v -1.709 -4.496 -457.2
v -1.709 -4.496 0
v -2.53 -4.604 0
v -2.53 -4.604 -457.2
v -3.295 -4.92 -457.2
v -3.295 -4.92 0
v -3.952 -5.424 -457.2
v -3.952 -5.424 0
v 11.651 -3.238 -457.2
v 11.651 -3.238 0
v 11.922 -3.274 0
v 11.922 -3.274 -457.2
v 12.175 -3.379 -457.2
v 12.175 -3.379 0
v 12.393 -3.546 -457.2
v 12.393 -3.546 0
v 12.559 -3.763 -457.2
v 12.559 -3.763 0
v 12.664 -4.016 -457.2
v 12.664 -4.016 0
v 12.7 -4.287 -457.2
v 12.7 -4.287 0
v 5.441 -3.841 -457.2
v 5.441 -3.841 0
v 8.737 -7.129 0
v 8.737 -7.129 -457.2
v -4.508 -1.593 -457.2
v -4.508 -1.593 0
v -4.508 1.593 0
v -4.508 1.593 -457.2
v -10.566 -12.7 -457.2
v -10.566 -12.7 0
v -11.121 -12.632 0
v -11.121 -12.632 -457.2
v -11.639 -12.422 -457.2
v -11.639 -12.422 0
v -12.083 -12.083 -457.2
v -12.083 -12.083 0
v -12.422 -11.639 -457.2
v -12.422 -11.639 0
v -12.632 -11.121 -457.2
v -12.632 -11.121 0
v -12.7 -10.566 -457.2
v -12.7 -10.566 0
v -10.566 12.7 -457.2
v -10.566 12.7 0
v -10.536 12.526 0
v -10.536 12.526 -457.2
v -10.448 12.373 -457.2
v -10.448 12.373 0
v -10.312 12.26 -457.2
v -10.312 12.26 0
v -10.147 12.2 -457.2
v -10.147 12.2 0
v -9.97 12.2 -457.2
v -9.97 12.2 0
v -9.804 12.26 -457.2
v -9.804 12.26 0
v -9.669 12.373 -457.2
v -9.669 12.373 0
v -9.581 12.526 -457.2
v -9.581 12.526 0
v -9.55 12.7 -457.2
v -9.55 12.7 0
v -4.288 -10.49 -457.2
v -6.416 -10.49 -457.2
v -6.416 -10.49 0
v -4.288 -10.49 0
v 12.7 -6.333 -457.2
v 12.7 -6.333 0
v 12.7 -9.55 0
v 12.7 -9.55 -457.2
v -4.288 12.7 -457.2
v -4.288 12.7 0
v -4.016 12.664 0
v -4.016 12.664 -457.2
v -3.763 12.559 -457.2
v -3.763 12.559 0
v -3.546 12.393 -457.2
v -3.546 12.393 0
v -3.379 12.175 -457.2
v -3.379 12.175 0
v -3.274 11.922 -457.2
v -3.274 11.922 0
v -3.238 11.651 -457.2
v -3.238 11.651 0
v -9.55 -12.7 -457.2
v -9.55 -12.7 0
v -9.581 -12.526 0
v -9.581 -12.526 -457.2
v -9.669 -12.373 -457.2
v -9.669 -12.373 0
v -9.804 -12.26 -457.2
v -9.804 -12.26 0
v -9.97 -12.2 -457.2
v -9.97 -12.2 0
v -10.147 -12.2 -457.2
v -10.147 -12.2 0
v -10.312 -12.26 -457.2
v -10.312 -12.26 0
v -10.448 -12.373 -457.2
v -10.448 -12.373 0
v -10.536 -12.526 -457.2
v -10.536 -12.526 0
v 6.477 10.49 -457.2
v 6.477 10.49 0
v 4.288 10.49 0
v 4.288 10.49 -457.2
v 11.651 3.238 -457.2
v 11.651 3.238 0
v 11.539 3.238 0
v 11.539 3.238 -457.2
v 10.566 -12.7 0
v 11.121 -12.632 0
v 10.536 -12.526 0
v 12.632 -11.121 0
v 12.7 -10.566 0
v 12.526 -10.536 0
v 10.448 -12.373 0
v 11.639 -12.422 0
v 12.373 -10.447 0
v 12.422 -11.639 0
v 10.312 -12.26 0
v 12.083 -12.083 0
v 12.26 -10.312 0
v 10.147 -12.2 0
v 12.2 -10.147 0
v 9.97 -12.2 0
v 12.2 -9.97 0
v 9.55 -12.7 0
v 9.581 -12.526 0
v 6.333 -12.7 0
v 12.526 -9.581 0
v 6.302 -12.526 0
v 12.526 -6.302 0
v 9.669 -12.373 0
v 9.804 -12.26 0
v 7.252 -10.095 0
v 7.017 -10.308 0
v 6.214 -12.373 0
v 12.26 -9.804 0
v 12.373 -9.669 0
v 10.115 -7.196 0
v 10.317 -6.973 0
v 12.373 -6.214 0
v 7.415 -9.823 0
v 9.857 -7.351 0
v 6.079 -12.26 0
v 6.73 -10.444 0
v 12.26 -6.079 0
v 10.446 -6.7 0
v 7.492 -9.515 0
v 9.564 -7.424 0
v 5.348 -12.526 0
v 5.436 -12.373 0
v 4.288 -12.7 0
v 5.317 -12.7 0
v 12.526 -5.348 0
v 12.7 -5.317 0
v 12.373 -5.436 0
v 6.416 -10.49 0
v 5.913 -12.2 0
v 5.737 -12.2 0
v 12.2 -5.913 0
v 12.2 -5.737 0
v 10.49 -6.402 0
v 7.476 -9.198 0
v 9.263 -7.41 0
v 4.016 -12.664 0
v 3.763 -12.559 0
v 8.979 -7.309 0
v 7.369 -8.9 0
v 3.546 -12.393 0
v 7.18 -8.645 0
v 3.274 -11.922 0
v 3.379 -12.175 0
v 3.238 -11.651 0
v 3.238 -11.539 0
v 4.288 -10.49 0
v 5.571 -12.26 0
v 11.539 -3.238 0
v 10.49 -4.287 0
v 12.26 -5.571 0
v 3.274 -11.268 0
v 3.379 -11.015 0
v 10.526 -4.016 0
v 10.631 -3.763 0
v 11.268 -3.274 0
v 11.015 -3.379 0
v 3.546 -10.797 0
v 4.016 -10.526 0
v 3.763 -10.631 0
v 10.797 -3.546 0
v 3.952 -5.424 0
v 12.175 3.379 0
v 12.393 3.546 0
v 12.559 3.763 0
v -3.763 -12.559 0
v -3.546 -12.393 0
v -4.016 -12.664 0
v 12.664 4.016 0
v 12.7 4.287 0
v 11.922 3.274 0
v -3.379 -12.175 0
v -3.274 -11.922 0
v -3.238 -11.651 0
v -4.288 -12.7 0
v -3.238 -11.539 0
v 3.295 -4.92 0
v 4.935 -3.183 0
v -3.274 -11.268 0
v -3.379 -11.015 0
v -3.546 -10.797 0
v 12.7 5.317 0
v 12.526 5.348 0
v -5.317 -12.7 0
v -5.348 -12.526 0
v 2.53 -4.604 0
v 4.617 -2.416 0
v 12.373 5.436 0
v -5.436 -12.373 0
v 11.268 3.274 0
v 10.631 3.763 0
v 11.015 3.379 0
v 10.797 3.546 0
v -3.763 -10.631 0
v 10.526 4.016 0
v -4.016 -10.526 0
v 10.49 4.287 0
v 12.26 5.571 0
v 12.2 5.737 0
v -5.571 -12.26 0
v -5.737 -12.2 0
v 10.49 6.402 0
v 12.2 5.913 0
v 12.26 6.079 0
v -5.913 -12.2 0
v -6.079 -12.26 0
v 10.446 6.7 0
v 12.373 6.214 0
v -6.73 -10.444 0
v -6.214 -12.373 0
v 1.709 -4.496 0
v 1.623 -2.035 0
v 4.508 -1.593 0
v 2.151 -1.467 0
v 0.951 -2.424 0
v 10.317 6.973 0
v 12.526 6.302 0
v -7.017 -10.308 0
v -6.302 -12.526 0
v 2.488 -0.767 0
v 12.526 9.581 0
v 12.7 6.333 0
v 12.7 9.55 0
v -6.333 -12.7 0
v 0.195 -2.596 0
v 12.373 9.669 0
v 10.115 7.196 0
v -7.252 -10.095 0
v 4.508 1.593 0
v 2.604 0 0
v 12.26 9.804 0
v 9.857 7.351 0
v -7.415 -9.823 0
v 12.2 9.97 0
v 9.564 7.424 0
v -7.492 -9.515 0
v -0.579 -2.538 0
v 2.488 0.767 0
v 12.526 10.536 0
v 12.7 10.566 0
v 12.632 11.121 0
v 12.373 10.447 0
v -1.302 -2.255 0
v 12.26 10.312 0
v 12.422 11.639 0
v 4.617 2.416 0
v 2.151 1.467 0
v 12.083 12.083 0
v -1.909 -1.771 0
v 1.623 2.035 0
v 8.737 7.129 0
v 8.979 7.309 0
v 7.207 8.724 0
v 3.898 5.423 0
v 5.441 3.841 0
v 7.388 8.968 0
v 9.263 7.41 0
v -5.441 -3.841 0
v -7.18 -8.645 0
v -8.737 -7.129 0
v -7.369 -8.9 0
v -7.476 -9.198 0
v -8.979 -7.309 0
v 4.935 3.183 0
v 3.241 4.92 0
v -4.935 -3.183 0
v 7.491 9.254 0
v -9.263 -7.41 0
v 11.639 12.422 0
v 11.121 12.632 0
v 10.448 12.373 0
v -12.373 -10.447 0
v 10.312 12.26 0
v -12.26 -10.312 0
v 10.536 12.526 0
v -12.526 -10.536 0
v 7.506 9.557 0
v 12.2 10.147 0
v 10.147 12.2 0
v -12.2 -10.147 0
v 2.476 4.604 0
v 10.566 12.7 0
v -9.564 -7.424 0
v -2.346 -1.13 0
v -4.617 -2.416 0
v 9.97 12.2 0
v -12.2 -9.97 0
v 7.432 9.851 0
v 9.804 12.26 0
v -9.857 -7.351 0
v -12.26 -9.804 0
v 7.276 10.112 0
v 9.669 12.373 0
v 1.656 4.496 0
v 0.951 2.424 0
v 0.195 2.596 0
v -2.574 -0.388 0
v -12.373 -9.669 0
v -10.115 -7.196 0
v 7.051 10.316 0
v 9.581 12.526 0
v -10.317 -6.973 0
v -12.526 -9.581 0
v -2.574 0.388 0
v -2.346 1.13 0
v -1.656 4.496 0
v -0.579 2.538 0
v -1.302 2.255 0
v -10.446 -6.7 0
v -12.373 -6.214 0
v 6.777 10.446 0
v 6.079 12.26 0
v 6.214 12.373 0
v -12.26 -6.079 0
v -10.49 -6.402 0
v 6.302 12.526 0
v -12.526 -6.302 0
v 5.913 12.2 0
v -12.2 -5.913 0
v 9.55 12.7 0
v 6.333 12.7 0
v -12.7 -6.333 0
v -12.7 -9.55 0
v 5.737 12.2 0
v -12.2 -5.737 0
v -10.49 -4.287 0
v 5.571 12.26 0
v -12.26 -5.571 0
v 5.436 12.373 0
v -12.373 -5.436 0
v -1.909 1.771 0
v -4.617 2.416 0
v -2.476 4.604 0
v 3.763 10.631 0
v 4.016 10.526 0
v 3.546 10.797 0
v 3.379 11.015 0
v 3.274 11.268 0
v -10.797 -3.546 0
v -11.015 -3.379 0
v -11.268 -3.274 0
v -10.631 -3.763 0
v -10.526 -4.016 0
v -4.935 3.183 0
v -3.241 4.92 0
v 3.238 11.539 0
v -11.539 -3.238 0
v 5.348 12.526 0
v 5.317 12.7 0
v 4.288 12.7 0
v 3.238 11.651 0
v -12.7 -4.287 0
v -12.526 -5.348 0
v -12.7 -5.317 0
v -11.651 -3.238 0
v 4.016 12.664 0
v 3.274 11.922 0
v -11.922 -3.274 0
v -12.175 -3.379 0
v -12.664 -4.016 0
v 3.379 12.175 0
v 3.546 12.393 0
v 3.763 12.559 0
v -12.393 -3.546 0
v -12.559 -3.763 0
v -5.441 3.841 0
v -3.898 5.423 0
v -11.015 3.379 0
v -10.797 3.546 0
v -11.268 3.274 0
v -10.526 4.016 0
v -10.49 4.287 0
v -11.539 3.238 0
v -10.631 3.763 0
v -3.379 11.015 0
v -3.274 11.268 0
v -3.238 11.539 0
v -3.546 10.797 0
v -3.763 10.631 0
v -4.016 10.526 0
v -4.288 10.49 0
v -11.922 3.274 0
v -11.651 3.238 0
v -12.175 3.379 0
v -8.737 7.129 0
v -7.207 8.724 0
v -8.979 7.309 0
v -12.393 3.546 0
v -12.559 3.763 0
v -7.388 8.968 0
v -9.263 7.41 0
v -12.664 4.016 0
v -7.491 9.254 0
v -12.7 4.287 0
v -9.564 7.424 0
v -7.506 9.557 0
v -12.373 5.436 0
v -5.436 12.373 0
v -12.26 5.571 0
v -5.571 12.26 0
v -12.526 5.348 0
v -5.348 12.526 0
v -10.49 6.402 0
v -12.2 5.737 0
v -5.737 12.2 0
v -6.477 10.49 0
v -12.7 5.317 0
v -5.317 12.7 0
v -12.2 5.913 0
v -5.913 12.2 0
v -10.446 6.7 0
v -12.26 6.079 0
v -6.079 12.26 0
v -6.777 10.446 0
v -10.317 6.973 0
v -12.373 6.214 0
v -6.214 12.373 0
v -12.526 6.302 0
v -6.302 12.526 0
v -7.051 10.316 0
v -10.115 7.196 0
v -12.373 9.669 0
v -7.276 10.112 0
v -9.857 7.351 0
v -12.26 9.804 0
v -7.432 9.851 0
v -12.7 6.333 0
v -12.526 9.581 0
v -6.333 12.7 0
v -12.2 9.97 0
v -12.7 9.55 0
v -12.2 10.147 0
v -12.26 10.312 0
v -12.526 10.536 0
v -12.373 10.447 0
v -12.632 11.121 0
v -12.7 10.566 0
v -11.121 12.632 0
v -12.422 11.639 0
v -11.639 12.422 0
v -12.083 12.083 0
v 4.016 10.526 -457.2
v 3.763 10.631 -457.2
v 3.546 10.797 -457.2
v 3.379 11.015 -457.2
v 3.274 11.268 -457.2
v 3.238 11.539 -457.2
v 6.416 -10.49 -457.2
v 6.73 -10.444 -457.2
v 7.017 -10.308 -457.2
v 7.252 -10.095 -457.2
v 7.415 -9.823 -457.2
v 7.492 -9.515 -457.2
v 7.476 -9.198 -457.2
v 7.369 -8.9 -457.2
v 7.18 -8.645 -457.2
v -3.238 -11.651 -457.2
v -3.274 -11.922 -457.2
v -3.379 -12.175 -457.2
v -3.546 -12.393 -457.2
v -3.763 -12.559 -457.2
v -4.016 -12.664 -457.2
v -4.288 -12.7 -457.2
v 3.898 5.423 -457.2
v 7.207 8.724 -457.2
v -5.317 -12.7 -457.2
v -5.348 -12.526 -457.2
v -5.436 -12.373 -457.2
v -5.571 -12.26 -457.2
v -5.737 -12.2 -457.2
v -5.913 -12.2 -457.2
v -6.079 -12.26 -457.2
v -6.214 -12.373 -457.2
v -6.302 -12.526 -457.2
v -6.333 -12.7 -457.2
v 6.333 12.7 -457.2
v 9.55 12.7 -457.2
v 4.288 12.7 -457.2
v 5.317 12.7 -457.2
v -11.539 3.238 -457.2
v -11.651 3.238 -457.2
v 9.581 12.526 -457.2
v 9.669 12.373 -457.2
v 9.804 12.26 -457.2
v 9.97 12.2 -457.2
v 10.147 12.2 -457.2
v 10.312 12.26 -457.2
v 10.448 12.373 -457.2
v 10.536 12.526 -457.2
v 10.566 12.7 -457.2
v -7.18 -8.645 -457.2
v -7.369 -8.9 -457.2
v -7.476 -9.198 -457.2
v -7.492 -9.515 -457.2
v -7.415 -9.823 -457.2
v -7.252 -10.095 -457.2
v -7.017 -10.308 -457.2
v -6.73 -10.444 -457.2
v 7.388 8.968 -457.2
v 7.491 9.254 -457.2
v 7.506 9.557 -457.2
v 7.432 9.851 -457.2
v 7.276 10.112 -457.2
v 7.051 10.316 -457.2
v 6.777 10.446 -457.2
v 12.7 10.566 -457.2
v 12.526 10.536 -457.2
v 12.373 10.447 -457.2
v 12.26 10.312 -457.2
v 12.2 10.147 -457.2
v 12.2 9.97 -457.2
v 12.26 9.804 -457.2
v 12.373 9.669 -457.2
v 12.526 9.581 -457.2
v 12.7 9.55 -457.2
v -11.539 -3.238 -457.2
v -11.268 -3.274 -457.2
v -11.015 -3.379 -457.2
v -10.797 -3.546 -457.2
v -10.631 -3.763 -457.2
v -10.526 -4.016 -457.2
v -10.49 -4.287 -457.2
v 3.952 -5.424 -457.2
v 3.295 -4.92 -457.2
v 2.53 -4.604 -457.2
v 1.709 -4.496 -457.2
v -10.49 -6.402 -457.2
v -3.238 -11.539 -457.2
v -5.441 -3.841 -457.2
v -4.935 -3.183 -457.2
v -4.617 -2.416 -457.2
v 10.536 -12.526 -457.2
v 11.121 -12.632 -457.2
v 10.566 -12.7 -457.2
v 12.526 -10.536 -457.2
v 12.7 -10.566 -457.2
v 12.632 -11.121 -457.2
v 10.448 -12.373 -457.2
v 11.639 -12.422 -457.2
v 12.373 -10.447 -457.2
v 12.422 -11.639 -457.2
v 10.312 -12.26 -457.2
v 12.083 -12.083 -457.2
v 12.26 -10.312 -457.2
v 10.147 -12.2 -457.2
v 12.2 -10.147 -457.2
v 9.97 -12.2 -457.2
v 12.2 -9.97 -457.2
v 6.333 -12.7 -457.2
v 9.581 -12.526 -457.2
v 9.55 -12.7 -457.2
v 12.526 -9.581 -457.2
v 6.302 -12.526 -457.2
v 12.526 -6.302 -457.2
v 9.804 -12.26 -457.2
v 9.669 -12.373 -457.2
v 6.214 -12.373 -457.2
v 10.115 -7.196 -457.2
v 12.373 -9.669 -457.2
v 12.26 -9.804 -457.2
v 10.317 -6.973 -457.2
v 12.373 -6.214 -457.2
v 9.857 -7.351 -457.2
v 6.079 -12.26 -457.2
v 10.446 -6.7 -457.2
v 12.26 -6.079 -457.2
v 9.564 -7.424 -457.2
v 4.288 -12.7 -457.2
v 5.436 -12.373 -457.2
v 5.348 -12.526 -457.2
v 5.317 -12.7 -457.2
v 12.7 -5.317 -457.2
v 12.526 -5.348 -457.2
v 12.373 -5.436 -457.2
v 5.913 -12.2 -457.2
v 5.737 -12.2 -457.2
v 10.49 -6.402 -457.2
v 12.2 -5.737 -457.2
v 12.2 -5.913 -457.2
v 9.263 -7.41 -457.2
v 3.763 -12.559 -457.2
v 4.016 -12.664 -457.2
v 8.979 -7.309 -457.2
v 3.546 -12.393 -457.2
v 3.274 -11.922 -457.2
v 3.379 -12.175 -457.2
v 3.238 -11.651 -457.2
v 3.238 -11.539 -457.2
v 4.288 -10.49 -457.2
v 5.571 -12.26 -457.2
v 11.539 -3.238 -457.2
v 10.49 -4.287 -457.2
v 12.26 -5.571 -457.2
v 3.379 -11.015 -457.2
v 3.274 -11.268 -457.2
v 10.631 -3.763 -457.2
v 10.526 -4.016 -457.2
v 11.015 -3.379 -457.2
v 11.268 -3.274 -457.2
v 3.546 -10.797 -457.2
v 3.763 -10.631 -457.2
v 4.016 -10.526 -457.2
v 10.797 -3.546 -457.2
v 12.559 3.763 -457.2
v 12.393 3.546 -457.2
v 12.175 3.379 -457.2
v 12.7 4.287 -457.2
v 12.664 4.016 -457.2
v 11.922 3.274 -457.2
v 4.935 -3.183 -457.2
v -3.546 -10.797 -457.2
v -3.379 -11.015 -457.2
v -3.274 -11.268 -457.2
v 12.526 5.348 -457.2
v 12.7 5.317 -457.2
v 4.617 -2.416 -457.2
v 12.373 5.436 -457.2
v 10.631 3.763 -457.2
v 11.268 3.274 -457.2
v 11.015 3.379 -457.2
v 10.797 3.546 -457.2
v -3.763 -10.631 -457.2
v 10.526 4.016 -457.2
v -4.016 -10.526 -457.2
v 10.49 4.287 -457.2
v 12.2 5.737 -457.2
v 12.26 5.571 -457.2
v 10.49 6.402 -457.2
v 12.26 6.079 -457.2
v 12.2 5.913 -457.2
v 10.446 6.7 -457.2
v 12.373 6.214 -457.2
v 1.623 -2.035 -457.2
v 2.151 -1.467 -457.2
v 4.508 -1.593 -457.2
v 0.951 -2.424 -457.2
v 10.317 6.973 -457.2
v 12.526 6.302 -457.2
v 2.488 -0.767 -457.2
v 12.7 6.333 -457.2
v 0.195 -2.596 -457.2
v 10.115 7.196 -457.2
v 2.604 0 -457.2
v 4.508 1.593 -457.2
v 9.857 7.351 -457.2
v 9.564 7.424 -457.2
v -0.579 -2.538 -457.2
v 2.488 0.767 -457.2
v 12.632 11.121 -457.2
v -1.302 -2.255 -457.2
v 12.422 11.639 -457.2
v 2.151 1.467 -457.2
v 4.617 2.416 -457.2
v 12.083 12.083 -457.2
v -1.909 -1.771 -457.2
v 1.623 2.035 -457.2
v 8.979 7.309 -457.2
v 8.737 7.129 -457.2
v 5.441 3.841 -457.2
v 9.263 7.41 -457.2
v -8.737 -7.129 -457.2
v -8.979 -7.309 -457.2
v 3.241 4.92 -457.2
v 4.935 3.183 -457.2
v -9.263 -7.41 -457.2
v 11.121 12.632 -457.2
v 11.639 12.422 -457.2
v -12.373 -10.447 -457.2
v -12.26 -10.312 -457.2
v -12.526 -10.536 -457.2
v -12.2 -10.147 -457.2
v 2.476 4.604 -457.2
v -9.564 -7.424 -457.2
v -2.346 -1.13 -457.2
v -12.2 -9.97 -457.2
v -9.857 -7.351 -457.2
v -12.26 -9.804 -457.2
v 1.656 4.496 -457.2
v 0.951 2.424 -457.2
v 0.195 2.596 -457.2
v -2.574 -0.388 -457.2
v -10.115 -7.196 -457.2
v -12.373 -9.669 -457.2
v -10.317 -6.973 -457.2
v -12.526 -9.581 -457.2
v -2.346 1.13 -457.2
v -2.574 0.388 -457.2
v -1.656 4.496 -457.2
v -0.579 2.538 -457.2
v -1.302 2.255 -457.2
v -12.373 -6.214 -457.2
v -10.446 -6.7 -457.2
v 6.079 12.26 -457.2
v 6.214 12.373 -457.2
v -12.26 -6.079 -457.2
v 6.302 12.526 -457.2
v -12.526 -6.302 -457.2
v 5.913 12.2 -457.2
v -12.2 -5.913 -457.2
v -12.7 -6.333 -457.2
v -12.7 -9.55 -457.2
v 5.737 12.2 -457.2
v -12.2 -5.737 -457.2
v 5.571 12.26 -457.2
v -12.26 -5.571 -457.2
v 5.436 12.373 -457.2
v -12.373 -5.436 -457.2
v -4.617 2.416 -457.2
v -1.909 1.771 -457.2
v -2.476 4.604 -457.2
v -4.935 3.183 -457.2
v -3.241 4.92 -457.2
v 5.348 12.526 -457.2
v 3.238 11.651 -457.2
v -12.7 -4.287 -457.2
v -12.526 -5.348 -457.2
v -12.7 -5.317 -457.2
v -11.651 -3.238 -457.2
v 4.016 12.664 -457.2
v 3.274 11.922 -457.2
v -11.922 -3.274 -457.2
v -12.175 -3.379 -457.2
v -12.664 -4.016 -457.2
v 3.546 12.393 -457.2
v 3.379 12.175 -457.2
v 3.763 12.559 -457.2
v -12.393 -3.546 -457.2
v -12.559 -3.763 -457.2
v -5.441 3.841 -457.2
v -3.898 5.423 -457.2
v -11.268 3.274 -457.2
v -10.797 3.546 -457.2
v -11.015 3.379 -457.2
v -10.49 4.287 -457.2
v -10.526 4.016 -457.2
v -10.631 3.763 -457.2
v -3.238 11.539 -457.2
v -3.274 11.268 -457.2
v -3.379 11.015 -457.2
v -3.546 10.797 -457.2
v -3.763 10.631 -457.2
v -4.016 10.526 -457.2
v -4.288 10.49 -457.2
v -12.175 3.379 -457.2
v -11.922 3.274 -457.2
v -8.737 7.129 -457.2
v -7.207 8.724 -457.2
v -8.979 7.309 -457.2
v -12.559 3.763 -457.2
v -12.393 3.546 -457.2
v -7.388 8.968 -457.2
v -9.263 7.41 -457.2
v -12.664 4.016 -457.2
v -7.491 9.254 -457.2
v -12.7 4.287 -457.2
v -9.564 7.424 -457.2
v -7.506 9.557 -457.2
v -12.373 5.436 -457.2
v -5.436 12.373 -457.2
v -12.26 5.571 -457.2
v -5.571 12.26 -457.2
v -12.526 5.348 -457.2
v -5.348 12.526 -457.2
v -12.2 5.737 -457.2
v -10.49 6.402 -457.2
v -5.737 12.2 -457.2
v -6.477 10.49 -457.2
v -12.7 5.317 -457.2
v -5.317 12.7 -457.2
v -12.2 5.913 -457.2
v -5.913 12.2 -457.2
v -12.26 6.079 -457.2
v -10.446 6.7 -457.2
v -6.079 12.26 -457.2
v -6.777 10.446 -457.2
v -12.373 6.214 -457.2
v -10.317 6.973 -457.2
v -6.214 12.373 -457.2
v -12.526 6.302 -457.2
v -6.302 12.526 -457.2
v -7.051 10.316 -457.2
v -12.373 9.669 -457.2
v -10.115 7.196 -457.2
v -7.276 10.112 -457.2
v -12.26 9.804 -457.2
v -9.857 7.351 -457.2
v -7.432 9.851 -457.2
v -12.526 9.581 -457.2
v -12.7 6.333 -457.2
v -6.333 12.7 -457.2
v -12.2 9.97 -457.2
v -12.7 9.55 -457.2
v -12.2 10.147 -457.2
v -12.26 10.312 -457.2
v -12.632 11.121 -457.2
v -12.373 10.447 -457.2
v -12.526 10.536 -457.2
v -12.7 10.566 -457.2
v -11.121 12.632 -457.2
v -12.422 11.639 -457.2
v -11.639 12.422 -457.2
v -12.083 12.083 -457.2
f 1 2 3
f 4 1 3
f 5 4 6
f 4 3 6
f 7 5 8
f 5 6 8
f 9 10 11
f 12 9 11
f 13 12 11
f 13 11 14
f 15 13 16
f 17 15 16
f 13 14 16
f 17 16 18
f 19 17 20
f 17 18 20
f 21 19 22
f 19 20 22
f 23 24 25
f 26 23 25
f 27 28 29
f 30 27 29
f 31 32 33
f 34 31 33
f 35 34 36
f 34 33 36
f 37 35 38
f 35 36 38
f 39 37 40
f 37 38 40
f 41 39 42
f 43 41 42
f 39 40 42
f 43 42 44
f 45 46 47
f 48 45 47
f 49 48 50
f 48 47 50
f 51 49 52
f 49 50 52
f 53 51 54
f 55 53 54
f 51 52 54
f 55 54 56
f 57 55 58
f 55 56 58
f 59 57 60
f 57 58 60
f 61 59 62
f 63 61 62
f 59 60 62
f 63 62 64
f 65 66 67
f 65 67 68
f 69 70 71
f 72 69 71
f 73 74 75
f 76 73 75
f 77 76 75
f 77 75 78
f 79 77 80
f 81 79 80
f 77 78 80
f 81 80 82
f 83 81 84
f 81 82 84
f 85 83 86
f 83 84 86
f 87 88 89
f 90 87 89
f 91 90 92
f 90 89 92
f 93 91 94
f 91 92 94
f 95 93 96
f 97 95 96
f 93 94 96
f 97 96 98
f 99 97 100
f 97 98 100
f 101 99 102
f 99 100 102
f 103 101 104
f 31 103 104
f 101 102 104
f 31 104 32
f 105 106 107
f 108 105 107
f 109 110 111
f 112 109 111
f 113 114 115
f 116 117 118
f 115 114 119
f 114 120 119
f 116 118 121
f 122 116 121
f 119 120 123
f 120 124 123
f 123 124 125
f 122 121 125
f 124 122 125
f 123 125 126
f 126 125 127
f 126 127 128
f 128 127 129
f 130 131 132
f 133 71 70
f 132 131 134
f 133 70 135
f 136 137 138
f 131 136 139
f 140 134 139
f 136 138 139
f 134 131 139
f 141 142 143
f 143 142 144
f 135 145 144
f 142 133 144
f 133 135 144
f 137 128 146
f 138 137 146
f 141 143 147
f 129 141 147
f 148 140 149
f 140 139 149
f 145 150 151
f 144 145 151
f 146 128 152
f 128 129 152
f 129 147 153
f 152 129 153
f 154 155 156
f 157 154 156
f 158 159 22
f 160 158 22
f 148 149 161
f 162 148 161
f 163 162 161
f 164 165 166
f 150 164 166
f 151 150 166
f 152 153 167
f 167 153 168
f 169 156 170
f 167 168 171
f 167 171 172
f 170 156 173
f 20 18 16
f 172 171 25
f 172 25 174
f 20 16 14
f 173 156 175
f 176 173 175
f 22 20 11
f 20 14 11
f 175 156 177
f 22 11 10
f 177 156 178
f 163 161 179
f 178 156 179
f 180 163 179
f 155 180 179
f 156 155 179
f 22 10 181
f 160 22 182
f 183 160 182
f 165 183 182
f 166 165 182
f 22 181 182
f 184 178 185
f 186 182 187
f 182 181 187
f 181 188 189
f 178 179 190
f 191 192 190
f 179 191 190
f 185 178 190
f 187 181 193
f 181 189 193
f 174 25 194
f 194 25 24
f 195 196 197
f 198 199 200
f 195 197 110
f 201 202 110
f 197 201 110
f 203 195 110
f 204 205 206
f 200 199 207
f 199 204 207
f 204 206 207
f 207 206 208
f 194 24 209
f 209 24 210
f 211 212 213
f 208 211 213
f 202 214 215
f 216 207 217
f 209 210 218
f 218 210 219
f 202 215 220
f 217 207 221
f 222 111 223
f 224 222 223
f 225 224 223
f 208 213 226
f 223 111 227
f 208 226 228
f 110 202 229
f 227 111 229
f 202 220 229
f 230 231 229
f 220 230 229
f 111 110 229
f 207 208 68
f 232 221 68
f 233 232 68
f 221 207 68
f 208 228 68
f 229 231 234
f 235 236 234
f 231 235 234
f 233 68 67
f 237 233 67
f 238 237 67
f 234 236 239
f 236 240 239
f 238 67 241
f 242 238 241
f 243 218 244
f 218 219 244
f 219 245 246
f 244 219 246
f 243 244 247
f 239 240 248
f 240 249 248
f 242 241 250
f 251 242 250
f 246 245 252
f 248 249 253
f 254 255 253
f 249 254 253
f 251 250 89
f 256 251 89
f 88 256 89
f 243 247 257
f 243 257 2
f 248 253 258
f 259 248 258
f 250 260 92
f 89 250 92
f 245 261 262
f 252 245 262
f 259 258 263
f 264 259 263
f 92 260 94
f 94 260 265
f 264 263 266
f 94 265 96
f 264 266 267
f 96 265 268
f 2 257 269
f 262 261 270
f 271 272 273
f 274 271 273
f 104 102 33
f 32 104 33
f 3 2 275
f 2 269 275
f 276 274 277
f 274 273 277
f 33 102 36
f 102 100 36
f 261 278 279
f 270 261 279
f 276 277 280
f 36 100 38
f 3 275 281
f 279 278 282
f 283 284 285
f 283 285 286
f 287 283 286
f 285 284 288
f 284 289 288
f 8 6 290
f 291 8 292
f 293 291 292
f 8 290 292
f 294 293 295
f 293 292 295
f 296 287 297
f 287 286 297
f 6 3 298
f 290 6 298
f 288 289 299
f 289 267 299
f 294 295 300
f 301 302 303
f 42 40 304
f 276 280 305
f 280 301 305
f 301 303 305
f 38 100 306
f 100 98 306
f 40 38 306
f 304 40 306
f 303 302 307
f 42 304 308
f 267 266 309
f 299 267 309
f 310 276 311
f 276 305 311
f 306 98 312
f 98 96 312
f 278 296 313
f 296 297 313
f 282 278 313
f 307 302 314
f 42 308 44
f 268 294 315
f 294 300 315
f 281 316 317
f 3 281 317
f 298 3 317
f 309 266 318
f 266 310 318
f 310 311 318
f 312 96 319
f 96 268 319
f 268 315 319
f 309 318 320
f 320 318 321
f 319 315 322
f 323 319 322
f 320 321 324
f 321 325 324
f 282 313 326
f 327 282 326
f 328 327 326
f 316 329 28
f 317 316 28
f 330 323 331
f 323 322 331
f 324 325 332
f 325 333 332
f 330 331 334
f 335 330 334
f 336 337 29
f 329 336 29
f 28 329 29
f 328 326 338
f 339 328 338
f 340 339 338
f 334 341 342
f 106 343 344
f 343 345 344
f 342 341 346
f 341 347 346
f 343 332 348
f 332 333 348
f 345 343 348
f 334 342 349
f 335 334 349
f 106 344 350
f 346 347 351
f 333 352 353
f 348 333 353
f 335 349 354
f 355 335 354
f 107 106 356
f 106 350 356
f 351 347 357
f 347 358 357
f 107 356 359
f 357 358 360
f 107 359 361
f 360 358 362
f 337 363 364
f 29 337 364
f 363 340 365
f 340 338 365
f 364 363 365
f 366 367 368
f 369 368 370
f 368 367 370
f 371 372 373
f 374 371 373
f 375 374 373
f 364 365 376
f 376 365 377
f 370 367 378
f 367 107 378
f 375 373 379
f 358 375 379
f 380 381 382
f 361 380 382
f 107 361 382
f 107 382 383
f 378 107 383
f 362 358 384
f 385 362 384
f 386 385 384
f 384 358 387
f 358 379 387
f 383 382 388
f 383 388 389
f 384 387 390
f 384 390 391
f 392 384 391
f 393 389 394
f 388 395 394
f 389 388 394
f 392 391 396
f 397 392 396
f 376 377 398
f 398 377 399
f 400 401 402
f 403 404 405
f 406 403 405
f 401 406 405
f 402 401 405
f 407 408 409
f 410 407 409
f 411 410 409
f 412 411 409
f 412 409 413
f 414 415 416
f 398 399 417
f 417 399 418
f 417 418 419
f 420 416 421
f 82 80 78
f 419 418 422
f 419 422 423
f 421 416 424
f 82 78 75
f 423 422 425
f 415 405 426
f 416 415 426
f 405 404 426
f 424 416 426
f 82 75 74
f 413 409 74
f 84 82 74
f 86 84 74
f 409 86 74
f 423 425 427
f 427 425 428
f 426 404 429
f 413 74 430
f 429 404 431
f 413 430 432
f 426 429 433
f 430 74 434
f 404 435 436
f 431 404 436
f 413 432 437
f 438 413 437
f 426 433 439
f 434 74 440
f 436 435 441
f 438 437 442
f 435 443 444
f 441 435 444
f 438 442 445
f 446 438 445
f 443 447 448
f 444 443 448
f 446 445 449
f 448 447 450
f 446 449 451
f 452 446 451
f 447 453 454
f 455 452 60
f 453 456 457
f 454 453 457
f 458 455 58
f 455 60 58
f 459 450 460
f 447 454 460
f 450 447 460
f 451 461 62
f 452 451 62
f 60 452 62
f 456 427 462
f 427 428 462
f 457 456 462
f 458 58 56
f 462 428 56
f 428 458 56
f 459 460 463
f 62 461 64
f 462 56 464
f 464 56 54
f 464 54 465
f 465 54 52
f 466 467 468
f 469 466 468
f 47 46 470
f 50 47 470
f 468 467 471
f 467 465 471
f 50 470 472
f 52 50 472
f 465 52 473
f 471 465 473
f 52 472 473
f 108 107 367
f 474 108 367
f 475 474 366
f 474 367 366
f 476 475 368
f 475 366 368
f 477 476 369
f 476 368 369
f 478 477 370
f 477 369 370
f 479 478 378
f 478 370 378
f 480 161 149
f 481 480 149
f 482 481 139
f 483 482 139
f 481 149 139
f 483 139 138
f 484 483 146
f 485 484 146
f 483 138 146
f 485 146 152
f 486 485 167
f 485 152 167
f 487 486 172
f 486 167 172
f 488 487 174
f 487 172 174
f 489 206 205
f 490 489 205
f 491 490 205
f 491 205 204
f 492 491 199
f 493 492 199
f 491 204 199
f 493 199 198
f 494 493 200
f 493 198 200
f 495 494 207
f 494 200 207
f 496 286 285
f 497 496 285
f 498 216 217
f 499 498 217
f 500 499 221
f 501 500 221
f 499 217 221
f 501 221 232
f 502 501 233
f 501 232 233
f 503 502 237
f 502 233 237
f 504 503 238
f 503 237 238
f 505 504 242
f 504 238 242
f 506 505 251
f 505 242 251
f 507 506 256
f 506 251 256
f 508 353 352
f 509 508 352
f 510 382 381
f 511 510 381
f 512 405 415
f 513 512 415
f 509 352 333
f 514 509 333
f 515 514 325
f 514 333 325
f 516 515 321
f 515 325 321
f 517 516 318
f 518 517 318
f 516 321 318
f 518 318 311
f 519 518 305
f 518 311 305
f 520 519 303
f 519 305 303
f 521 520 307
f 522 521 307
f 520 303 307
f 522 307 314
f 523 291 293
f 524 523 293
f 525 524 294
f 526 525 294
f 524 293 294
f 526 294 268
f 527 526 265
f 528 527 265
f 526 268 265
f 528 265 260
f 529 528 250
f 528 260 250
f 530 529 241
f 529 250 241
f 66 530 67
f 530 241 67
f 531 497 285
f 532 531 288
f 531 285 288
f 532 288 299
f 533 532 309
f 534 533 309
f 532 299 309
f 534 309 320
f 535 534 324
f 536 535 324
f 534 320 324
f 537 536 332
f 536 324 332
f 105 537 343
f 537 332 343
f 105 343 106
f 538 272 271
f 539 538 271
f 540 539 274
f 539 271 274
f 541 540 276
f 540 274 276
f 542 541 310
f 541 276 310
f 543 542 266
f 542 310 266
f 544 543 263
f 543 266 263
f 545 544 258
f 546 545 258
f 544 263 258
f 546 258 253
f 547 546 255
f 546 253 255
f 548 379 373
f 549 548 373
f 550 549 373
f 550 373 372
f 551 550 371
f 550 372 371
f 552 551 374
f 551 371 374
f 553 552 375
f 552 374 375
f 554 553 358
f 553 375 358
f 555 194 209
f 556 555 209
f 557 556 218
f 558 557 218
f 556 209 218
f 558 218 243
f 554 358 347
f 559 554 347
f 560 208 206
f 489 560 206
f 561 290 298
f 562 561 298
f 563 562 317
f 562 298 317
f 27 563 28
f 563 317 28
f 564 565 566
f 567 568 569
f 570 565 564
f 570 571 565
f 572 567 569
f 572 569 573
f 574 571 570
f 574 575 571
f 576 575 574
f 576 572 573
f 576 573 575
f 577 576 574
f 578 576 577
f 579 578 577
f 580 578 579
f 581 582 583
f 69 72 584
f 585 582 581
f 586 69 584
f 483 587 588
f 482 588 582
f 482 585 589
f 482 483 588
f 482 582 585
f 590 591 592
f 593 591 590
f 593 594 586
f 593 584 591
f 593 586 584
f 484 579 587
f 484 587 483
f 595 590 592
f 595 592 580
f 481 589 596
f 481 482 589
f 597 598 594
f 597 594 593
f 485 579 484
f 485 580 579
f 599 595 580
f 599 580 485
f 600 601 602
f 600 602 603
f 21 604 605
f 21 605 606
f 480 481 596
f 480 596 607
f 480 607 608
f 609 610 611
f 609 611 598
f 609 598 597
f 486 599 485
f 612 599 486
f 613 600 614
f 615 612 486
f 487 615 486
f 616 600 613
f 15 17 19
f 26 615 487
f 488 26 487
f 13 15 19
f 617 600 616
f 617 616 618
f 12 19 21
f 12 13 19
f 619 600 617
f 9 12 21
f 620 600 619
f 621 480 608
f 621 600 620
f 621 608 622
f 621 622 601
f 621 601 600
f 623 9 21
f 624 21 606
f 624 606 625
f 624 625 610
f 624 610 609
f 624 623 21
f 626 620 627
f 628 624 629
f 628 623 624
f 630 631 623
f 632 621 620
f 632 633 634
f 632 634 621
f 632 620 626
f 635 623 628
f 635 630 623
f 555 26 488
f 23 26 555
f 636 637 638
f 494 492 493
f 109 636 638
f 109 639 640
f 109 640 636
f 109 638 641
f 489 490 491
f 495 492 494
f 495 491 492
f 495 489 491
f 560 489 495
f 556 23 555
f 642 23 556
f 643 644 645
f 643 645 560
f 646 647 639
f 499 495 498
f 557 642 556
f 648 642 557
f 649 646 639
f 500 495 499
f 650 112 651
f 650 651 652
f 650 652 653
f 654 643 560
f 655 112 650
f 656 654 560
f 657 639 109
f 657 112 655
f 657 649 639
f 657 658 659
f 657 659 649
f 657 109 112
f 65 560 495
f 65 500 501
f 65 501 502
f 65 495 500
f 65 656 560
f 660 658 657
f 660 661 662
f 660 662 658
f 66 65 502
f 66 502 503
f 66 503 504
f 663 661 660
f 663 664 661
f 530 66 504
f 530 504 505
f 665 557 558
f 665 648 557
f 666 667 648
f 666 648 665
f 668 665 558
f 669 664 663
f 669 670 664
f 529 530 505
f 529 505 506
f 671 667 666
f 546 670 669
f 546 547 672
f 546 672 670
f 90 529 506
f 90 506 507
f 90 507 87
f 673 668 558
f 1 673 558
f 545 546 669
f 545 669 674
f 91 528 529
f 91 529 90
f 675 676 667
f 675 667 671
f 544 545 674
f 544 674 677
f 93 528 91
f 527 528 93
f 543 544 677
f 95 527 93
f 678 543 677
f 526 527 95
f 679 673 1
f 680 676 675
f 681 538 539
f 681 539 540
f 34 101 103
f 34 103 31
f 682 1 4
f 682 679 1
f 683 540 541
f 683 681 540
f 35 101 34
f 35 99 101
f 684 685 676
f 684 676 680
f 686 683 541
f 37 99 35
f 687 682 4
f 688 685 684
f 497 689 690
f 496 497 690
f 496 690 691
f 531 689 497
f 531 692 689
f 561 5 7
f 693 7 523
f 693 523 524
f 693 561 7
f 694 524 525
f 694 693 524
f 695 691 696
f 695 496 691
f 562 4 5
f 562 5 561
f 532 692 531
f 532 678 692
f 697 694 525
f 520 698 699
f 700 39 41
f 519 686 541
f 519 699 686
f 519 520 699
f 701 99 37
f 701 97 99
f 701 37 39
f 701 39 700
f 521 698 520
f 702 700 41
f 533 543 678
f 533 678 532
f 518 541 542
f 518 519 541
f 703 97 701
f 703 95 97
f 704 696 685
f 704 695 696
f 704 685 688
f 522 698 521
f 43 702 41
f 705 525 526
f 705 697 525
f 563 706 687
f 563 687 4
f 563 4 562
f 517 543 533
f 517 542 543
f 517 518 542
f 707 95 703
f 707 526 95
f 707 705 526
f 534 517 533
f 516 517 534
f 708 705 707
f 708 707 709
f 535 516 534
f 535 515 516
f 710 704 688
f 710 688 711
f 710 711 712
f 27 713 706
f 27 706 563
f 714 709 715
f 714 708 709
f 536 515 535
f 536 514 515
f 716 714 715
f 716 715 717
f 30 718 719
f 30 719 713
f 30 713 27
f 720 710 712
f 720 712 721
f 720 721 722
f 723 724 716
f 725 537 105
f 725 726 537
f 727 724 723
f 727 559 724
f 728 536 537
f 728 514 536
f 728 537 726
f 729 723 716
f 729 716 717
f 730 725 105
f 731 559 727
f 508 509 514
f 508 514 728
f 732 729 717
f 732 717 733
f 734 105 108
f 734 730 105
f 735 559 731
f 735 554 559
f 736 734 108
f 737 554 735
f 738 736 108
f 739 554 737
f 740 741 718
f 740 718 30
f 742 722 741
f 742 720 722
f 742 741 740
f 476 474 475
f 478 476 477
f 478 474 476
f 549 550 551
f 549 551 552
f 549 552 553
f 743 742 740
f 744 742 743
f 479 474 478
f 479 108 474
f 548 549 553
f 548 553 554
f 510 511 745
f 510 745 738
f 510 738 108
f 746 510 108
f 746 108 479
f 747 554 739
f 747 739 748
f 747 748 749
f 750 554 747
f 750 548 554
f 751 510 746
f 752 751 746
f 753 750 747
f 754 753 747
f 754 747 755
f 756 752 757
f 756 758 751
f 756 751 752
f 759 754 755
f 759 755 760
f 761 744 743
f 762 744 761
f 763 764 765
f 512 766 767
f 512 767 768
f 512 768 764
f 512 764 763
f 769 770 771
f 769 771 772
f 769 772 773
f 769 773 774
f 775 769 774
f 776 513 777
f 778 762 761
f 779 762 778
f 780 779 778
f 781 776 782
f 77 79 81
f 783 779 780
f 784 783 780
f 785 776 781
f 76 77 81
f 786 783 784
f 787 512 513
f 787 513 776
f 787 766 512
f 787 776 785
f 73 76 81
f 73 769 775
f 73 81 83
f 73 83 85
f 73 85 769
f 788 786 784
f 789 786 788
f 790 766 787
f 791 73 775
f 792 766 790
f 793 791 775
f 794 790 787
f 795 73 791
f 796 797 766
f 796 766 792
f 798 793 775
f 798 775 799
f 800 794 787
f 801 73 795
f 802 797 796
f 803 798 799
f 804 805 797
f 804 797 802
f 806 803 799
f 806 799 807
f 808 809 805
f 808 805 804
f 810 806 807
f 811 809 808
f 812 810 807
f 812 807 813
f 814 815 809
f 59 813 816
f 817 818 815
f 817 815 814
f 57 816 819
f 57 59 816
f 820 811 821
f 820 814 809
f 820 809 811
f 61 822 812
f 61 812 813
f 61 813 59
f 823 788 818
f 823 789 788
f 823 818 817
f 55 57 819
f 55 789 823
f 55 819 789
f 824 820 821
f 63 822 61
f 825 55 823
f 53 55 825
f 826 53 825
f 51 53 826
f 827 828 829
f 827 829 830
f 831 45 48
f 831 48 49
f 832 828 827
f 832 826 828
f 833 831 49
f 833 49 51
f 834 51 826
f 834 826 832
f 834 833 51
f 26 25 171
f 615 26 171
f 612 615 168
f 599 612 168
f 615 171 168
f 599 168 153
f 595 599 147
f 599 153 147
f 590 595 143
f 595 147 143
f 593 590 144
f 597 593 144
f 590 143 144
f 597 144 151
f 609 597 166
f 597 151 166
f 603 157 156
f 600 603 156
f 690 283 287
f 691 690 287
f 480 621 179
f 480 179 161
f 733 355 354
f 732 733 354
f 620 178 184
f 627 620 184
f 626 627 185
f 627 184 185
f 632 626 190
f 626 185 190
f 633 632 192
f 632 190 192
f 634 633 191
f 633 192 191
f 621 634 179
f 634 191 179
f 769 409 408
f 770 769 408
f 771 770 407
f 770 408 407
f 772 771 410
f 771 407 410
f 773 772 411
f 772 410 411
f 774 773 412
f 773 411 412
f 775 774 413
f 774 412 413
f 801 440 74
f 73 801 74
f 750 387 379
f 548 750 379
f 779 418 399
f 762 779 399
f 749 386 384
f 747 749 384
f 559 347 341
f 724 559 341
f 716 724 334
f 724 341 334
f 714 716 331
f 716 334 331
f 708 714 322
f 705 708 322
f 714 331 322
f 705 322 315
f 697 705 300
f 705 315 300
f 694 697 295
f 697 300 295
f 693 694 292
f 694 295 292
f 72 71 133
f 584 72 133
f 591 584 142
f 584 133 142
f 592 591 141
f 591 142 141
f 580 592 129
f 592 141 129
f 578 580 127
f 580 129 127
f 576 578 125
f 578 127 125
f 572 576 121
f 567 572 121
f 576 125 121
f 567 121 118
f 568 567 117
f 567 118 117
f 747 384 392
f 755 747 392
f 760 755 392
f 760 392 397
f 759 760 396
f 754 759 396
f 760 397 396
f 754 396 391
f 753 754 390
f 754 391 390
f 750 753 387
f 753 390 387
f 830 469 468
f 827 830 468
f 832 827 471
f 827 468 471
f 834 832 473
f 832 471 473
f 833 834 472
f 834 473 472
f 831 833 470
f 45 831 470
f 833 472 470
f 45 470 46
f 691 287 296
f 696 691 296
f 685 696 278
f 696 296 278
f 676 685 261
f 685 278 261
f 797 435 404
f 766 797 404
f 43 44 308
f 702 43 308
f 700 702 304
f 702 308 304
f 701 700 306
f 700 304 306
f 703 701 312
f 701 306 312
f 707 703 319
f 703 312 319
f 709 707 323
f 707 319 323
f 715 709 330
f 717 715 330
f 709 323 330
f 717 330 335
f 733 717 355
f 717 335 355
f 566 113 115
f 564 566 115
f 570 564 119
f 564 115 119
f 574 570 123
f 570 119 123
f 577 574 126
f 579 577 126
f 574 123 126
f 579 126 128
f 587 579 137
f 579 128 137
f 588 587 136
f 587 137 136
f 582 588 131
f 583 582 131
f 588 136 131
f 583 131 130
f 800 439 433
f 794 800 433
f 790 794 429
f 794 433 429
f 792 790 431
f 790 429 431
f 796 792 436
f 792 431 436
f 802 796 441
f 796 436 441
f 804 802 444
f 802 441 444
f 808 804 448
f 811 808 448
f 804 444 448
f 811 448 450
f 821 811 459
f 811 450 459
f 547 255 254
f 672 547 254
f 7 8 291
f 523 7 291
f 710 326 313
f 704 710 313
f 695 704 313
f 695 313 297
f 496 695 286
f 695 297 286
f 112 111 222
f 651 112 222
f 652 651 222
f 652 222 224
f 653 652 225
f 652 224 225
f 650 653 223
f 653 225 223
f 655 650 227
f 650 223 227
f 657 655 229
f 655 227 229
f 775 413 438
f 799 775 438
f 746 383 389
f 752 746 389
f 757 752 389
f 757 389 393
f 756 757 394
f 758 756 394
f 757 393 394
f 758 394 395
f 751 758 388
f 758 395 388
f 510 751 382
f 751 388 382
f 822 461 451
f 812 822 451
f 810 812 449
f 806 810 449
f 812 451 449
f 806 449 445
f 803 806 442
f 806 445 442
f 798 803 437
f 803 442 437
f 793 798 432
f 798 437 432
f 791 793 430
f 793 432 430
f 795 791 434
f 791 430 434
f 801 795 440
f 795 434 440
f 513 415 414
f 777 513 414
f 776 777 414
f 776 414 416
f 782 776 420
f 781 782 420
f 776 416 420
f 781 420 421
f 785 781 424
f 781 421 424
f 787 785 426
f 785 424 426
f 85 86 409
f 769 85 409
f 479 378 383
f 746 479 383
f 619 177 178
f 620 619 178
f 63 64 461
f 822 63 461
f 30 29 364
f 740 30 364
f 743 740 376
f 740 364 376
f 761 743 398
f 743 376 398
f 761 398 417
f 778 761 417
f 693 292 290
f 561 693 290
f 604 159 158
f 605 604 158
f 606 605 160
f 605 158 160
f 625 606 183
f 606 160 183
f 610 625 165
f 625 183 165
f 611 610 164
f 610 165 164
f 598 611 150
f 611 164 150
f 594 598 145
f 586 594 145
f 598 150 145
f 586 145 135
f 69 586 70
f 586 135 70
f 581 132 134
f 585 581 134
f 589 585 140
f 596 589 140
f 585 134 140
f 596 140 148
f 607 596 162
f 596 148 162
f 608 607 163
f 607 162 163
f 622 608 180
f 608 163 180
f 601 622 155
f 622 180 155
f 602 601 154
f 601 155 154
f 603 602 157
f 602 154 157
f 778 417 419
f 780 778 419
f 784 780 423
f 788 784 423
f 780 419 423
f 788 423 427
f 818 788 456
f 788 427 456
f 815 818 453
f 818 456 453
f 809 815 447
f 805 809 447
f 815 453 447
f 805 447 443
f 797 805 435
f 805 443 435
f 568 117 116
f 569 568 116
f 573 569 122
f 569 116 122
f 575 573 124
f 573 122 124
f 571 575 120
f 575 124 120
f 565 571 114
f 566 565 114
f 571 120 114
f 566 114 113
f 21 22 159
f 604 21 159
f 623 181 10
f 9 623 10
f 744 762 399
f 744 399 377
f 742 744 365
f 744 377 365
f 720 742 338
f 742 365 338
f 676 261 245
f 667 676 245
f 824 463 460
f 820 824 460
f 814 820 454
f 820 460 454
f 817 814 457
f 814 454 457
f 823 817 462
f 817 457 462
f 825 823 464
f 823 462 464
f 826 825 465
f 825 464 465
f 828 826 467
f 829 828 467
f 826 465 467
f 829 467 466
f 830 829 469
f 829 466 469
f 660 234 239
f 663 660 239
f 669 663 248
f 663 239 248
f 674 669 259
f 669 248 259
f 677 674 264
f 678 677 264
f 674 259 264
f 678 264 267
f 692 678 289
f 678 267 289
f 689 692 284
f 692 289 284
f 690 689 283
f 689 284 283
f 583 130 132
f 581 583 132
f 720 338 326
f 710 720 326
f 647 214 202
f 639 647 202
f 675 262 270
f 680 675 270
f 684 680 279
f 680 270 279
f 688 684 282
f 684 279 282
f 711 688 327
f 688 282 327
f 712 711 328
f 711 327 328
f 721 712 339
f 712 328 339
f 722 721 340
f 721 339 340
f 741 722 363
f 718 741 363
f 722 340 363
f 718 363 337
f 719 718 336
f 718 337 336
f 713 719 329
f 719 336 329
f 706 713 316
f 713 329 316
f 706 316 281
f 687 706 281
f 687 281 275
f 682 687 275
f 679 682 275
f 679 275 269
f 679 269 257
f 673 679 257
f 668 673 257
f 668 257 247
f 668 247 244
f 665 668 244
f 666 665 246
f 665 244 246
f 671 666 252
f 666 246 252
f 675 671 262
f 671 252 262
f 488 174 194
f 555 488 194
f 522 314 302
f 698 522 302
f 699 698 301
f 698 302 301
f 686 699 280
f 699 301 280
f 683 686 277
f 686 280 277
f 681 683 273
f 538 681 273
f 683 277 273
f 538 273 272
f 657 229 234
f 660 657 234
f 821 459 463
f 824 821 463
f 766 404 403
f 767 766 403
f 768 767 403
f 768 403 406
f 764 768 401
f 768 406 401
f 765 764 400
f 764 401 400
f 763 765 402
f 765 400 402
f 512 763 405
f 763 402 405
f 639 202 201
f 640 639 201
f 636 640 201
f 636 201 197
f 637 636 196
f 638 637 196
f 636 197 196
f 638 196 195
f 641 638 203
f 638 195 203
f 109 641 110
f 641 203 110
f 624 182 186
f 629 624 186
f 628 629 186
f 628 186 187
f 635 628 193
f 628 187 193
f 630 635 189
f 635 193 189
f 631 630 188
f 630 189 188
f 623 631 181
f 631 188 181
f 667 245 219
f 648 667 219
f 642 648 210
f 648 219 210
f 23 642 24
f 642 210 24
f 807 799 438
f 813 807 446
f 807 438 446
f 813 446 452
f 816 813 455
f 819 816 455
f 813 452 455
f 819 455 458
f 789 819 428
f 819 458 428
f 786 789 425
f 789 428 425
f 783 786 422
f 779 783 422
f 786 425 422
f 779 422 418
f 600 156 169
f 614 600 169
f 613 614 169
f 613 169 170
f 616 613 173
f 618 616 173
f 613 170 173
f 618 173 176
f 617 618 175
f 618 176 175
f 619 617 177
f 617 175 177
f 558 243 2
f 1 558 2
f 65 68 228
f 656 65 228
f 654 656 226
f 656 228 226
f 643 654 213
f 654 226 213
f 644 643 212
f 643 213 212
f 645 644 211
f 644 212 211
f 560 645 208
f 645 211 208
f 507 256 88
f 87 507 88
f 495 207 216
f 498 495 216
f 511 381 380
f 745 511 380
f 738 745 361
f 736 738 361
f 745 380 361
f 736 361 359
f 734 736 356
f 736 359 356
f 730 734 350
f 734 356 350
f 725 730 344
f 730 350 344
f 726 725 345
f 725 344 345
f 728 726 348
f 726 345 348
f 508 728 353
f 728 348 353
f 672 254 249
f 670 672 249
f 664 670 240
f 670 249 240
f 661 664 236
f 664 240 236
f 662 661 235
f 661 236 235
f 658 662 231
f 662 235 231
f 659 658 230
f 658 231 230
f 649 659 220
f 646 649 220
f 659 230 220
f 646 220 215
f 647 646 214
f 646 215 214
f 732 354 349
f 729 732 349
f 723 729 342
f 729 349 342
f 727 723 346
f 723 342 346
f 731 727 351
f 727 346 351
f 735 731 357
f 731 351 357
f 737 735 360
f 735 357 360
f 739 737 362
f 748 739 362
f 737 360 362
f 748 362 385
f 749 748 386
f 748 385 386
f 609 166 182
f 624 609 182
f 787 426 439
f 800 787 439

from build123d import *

# Parameters (mm, degrees)
SKETCH1_R      = 2.6035
EXTRUDE1_DEPTH = 457.2


with BuildPart() as part:
    # Sketch1 → Extrude1 (new body)
    with BuildSketch(Plane.XY):
        with BuildLine():
            Line((-7.207036008, 8.724370562), (-3.898272566, 5.423169045))
            ThreePointArc((-3.898272566, 5.423169045), (-2.869120213, 4.736787962), (-1.655778399, 4.4958))
            Line((-1.655778399, 4.4958), (1.655778399, 4.4958))
            ThreePointArc((1.655778399, 4.4958), (2.869120213, 4.736787962), (3.898272566, 5.423169045))
            Line((3.898272566, 5.423169045), (7.207036008, 8.724370562))
            ThreePointArc((7.207036008, 8.724370562), (7.432222385, 9.85140422), (6.476788598, 10.4902))
            Line((6.476788598, 10.4902), (4.287512407, 10.4902))
            ThreePointArc((4.287512407, 10.4902), (3.54574862, 10.79744862), (3.2385, 11.539212407))
            Line((3.2385, 11.539212407), (3.2385, 11.650987593))
            ThreePointArc((3.2385, 11.650987593), (3.54574862, 12.39275138), (4.287512407, 12.7))
            Line((4.287512407, 12.7), (5.317126718, 12.7))
            ThreePointArc((5.317126718, 12.7), (5.825126718, 12.192), (6.333126718, 12.7))
            Line((6.333126718, 12.7), (9.550443118, 12.7))
            ThreePointArc((9.550443118, 12.7), (10.058366869, 12.192000006), (10.566443095, 12.699847501))
            ThreePointArc((10.566443095, 12.699847501), (12.082537762, 12.08250727), (12.699846982, 10.566399977))
            ThreePointArc((12.699846982, 10.566399977), (12.192000006, 10.058323491), (12.7, 9.5504))
            Line((12.7, 9.5504), (12.7, 6.3330836))
            ThreePointArc((12.7, 6.3330836), (12.192, 5.8250836), (12.7, 5.3170836))
            Line((12.7, 5.3170836), (12.7, 4.287469289))
            ThreePointArc((12.7, 4.287469289), (12.39275138, 3.545705502), (11.650987593, 3.238456882))
            Line((11.650987593, 3.238456882), (11.539212407, 3.238456882))
            ThreePointArc((11.539212407, 3.238456882), (10.79744862, 3.545705502), (10.4902, 4.287469289))
            Line((10.4902, 4.287469289), (10.4902, 6.402089023))
            ThreePointArc((10.4902, 6.402089023), (9.856505071, 7.351067942), (8.737131347, 7.129408934))
            Line((8.737131347, 7.129408934), (5.441005833, 3.840816462))
            ThreePointArc((5.441005833, 3.840816462), (4.750877967, 2.809883091), (4.5085, 1.593185507))
            Line((4.5085, 1.593185507), (4.5085, -1.593185507))
            ThreePointArc((4.5085, -1.593185507), (4.750877967, -2.809883091), (5.441005833, -3.840816462))
            Line((5.441005833, -3.840816462), (8.737131347, -7.129408934))
            ThreePointArc((8.737131347, -7.129408934), (9.856505071, -7.351067942), (10.4902, -6.402089023))
            Line((10.4902, -6.402089023), (10.4902, -4.287469289))
            ThreePointArc((10.4902, -4.287469289), (10.79744862, -3.545705502), (11.539212407, -3.238456882))
            Line((11.539212407, -3.238456882), (11.650987593, -3.238456882))
            ThreePointArc((11.650987593, -3.238456882), (12.39275138, -3.545705502), (12.7, -4.287469289))
            Line((12.7, -4.287469289), (12.7, -5.3170836))
            ThreePointArc((12.7, -5.3170836), (12.192, -5.8250836), (12.7, -6.3330836))
            Line((12.7, -6.3330836), (12.7, -9.5504))
            ThreePointArc((12.7, -9.5504), (12.192000006, -10.058323491), (12.699846982, -10.566399977))
            ThreePointArc((12.699846982, -10.566399977), (12.082537762, -12.08250727), (10.566443095, -12.699847501))
            ThreePointArc((10.566443095, -12.699847501), (10.058366869, -12.192000006), (9.550443118, -12.7))
            Line((9.550443118, -12.7), (6.333126718, -12.7))
            ThreePointArc((6.333126718, -12.7), (5.825126718, -12.192), (5.317126718, -12.7))
            Line((5.317126718, -12.7), (4.287512407, -12.7))
            ThreePointArc((4.287512407, -12.7), (3.54574862, -12.39275138), (3.2385, -11.650987593))
            Line((3.2385, -11.650987593), (3.2385, -11.539212407))
            ThreePointArc((3.2385, -11.539212407), (3.54574862, -10.79744862), (4.287512407, -10.4902))
            Line((4.287512407, -10.4902), (6.416408329, -10.4902))
            ThreePointArc((6.416408329, -10.4902), (7.41473083, -9.822813117), (7.179650497, -8.645192506))
            Line((7.179650497, -8.645192506), (3.952270251, -5.423690499))
            ThreePointArc((3.952270251, -5.423690499), (2.922936451, -4.736929036), (1.709253557, -4.4958))
            Line((1.709253557, -4.4958), (-1.709253557, -4.4958))
            ThreePointArc((-1.709253557, -4.4958), (-2.922936451, -4.736929036), (-3.952270251, -5.423690499))
            Line((-3.952270251, -5.423690499), (-7.179650497, -8.645192506))
            ThreePointArc((-7.179650497, -8.645192506), (-7.41473083, -9.822813117), (-6.416408329, -10.4902))
            Line((-6.416408329, -10.4902), (-4.287512407, -10.4902))
            ThreePointArc((-4.287512407, -10.4902), (-3.54574862, -10.79744862), (-3.2385, -11.539212407))
            Line((-3.2385, -11.539212407), (-3.2385, -11.650987593))
            ThreePointArc((-3.2385, -11.650987593), (-3.54574862, -12.39275138), (-4.287512407, -12.7))
            Line((-4.287512407, -12.7), (-5.317126718, -12.7))
            ThreePointArc((-5.317126718, -12.7), (-5.825126718, -12.192), (-6.333126718, -12.7))
            Line((-6.333126718, -12.7), (-9.550443118, -12.7))
            ThreePointArc((-9.550443118, -12.7), (-10.058366869, -12.192000006), (-10.566443095, -12.699847501))
            ThreePointArc((-10.566443095, -12.699847501), (-12.082537762, -12.08250727), (-12.699846982, -10.566399977))
            ThreePointArc((-12.699846982, -10.566399977), (-12.192000006, -10.058323491), (-12.7, -9.5504))
            Line((-12.7, -9.5504), (-12.7, -6.3330836))
            ThreePointArc((-12.7, -6.3330836), (-12.192, -5.8250836), (-12.7, -5.3170836))
            Line((-12.7, -5.3170836), (-12.7, -4.287469289))
            ThreePointArc((-12.7, -4.287469289), (-12.39275138, -3.545705502), (-11.650987593, -3.238456882))
            Line((-11.650987593, -3.238456882), (-11.539212407, -3.238456882))
            ThreePointArc((-11.539212407, -3.238456882), (-10.79744862, -3.545705502), (-10.4902, -4.287469289))
            Line((-10.4902, -4.287469289), (-10.4902, -6.402089023))
            ThreePointArc((-10.4902, -6.402089023), (-9.856505071, -7.351067942), (-8.737131347, -7.129408934))
            Line((-8.737131347, -7.129408934), (-5.441005833, -3.840816462))
            ThreePointArc((-5.441005833, -3.840816462), (-4.750877967, -2.809883091), (-4.5085, -1.593185507))
            Line((-4.5085, -1.593185507), (-4.5085, 1.593185507))
            ThreePointArc((-4.5085, 1.593185507), (-4.750877967, 2.809883091), (-5.441005833, 3.840816462))
            Line((-5.441005833, 3.840816462), (-8.737131347, 7.129408934))
            ThreePointArc((-8.737131347, 7.129408934), (-9.856505071, 7.351067942), (-10.4902, 6.402089023))
            Line((-10.4902, 6.402089023), (-10.4902, 4.287469289))
            ThreePointArc((-10.4902, 4.287469289), (-10.79744862, 3.545705502), (-11.539212407, 3.238456882))
            Line((-11.539212407, 3.238456882), (-11.650987593, 3.238456882))
            ThreePointArc((-11.650987593, 3.238456882), (-12.39275138, 3.545705502), (-12.7, 4.287469289))
            Line((-12.7, 4.287469289), (-12.7, 5.3170836))
            ThreePointArc((-12.7, 5.3170836), (-12.192, 5.8250836), (-12.7, 6.3330836))
            Line((-12.7, 6.3330836), (-12.7, 9.5504))
            ThreePointArc((-12.7, 9.5504), (-12.192000006, 10.058323491), (-12.699846982, 10.566399977))
            ThreePointArc((-12.699846982, 10.566399977), (-12.082537762, 12.08250727), (-10.566443095, 12.699847501))
            ThreePointArc((-10.566443095, 12.699847501), (-10.058366869, 12.192000006), (-9.550443118, 12.7))
            Line((-9.550443118, 12.7), (-6.333126718, 12.7))
            ThreePointArc((-6.333126718, 12.7), (-5.825126718, 12.192), (-5.317126718, 12.7))
            Line((-5.317126718, 12.7), (-4.287512407, 12.7))
            ThreePointArc((-4.287512407, 12.7), (-3.54574862, 12.39275138), (-3.2385, 11.650987593))
            Line((-3.2385, 11.650987593), (-3.2385, 11.539212407))
            ThreePointArc((-3.2385, 11.539212407), (-3.54574862, 10.79744862), (-4.287512407, 10.4902))
            Line((-4.287512407, 10.4902), (-6.476788598, 10.4902))
            ThreePointArc((-6.476788598, 10.4902), (-7.432222385, 9.85140422), (-7.207036008, 8.724370562))
        make_face()
        Circle(SKETCH1_R, mode=Mode.SUBTRACT)
    extrude(amount=-EXTRUDE1_DEPTH)


solid = part.part
